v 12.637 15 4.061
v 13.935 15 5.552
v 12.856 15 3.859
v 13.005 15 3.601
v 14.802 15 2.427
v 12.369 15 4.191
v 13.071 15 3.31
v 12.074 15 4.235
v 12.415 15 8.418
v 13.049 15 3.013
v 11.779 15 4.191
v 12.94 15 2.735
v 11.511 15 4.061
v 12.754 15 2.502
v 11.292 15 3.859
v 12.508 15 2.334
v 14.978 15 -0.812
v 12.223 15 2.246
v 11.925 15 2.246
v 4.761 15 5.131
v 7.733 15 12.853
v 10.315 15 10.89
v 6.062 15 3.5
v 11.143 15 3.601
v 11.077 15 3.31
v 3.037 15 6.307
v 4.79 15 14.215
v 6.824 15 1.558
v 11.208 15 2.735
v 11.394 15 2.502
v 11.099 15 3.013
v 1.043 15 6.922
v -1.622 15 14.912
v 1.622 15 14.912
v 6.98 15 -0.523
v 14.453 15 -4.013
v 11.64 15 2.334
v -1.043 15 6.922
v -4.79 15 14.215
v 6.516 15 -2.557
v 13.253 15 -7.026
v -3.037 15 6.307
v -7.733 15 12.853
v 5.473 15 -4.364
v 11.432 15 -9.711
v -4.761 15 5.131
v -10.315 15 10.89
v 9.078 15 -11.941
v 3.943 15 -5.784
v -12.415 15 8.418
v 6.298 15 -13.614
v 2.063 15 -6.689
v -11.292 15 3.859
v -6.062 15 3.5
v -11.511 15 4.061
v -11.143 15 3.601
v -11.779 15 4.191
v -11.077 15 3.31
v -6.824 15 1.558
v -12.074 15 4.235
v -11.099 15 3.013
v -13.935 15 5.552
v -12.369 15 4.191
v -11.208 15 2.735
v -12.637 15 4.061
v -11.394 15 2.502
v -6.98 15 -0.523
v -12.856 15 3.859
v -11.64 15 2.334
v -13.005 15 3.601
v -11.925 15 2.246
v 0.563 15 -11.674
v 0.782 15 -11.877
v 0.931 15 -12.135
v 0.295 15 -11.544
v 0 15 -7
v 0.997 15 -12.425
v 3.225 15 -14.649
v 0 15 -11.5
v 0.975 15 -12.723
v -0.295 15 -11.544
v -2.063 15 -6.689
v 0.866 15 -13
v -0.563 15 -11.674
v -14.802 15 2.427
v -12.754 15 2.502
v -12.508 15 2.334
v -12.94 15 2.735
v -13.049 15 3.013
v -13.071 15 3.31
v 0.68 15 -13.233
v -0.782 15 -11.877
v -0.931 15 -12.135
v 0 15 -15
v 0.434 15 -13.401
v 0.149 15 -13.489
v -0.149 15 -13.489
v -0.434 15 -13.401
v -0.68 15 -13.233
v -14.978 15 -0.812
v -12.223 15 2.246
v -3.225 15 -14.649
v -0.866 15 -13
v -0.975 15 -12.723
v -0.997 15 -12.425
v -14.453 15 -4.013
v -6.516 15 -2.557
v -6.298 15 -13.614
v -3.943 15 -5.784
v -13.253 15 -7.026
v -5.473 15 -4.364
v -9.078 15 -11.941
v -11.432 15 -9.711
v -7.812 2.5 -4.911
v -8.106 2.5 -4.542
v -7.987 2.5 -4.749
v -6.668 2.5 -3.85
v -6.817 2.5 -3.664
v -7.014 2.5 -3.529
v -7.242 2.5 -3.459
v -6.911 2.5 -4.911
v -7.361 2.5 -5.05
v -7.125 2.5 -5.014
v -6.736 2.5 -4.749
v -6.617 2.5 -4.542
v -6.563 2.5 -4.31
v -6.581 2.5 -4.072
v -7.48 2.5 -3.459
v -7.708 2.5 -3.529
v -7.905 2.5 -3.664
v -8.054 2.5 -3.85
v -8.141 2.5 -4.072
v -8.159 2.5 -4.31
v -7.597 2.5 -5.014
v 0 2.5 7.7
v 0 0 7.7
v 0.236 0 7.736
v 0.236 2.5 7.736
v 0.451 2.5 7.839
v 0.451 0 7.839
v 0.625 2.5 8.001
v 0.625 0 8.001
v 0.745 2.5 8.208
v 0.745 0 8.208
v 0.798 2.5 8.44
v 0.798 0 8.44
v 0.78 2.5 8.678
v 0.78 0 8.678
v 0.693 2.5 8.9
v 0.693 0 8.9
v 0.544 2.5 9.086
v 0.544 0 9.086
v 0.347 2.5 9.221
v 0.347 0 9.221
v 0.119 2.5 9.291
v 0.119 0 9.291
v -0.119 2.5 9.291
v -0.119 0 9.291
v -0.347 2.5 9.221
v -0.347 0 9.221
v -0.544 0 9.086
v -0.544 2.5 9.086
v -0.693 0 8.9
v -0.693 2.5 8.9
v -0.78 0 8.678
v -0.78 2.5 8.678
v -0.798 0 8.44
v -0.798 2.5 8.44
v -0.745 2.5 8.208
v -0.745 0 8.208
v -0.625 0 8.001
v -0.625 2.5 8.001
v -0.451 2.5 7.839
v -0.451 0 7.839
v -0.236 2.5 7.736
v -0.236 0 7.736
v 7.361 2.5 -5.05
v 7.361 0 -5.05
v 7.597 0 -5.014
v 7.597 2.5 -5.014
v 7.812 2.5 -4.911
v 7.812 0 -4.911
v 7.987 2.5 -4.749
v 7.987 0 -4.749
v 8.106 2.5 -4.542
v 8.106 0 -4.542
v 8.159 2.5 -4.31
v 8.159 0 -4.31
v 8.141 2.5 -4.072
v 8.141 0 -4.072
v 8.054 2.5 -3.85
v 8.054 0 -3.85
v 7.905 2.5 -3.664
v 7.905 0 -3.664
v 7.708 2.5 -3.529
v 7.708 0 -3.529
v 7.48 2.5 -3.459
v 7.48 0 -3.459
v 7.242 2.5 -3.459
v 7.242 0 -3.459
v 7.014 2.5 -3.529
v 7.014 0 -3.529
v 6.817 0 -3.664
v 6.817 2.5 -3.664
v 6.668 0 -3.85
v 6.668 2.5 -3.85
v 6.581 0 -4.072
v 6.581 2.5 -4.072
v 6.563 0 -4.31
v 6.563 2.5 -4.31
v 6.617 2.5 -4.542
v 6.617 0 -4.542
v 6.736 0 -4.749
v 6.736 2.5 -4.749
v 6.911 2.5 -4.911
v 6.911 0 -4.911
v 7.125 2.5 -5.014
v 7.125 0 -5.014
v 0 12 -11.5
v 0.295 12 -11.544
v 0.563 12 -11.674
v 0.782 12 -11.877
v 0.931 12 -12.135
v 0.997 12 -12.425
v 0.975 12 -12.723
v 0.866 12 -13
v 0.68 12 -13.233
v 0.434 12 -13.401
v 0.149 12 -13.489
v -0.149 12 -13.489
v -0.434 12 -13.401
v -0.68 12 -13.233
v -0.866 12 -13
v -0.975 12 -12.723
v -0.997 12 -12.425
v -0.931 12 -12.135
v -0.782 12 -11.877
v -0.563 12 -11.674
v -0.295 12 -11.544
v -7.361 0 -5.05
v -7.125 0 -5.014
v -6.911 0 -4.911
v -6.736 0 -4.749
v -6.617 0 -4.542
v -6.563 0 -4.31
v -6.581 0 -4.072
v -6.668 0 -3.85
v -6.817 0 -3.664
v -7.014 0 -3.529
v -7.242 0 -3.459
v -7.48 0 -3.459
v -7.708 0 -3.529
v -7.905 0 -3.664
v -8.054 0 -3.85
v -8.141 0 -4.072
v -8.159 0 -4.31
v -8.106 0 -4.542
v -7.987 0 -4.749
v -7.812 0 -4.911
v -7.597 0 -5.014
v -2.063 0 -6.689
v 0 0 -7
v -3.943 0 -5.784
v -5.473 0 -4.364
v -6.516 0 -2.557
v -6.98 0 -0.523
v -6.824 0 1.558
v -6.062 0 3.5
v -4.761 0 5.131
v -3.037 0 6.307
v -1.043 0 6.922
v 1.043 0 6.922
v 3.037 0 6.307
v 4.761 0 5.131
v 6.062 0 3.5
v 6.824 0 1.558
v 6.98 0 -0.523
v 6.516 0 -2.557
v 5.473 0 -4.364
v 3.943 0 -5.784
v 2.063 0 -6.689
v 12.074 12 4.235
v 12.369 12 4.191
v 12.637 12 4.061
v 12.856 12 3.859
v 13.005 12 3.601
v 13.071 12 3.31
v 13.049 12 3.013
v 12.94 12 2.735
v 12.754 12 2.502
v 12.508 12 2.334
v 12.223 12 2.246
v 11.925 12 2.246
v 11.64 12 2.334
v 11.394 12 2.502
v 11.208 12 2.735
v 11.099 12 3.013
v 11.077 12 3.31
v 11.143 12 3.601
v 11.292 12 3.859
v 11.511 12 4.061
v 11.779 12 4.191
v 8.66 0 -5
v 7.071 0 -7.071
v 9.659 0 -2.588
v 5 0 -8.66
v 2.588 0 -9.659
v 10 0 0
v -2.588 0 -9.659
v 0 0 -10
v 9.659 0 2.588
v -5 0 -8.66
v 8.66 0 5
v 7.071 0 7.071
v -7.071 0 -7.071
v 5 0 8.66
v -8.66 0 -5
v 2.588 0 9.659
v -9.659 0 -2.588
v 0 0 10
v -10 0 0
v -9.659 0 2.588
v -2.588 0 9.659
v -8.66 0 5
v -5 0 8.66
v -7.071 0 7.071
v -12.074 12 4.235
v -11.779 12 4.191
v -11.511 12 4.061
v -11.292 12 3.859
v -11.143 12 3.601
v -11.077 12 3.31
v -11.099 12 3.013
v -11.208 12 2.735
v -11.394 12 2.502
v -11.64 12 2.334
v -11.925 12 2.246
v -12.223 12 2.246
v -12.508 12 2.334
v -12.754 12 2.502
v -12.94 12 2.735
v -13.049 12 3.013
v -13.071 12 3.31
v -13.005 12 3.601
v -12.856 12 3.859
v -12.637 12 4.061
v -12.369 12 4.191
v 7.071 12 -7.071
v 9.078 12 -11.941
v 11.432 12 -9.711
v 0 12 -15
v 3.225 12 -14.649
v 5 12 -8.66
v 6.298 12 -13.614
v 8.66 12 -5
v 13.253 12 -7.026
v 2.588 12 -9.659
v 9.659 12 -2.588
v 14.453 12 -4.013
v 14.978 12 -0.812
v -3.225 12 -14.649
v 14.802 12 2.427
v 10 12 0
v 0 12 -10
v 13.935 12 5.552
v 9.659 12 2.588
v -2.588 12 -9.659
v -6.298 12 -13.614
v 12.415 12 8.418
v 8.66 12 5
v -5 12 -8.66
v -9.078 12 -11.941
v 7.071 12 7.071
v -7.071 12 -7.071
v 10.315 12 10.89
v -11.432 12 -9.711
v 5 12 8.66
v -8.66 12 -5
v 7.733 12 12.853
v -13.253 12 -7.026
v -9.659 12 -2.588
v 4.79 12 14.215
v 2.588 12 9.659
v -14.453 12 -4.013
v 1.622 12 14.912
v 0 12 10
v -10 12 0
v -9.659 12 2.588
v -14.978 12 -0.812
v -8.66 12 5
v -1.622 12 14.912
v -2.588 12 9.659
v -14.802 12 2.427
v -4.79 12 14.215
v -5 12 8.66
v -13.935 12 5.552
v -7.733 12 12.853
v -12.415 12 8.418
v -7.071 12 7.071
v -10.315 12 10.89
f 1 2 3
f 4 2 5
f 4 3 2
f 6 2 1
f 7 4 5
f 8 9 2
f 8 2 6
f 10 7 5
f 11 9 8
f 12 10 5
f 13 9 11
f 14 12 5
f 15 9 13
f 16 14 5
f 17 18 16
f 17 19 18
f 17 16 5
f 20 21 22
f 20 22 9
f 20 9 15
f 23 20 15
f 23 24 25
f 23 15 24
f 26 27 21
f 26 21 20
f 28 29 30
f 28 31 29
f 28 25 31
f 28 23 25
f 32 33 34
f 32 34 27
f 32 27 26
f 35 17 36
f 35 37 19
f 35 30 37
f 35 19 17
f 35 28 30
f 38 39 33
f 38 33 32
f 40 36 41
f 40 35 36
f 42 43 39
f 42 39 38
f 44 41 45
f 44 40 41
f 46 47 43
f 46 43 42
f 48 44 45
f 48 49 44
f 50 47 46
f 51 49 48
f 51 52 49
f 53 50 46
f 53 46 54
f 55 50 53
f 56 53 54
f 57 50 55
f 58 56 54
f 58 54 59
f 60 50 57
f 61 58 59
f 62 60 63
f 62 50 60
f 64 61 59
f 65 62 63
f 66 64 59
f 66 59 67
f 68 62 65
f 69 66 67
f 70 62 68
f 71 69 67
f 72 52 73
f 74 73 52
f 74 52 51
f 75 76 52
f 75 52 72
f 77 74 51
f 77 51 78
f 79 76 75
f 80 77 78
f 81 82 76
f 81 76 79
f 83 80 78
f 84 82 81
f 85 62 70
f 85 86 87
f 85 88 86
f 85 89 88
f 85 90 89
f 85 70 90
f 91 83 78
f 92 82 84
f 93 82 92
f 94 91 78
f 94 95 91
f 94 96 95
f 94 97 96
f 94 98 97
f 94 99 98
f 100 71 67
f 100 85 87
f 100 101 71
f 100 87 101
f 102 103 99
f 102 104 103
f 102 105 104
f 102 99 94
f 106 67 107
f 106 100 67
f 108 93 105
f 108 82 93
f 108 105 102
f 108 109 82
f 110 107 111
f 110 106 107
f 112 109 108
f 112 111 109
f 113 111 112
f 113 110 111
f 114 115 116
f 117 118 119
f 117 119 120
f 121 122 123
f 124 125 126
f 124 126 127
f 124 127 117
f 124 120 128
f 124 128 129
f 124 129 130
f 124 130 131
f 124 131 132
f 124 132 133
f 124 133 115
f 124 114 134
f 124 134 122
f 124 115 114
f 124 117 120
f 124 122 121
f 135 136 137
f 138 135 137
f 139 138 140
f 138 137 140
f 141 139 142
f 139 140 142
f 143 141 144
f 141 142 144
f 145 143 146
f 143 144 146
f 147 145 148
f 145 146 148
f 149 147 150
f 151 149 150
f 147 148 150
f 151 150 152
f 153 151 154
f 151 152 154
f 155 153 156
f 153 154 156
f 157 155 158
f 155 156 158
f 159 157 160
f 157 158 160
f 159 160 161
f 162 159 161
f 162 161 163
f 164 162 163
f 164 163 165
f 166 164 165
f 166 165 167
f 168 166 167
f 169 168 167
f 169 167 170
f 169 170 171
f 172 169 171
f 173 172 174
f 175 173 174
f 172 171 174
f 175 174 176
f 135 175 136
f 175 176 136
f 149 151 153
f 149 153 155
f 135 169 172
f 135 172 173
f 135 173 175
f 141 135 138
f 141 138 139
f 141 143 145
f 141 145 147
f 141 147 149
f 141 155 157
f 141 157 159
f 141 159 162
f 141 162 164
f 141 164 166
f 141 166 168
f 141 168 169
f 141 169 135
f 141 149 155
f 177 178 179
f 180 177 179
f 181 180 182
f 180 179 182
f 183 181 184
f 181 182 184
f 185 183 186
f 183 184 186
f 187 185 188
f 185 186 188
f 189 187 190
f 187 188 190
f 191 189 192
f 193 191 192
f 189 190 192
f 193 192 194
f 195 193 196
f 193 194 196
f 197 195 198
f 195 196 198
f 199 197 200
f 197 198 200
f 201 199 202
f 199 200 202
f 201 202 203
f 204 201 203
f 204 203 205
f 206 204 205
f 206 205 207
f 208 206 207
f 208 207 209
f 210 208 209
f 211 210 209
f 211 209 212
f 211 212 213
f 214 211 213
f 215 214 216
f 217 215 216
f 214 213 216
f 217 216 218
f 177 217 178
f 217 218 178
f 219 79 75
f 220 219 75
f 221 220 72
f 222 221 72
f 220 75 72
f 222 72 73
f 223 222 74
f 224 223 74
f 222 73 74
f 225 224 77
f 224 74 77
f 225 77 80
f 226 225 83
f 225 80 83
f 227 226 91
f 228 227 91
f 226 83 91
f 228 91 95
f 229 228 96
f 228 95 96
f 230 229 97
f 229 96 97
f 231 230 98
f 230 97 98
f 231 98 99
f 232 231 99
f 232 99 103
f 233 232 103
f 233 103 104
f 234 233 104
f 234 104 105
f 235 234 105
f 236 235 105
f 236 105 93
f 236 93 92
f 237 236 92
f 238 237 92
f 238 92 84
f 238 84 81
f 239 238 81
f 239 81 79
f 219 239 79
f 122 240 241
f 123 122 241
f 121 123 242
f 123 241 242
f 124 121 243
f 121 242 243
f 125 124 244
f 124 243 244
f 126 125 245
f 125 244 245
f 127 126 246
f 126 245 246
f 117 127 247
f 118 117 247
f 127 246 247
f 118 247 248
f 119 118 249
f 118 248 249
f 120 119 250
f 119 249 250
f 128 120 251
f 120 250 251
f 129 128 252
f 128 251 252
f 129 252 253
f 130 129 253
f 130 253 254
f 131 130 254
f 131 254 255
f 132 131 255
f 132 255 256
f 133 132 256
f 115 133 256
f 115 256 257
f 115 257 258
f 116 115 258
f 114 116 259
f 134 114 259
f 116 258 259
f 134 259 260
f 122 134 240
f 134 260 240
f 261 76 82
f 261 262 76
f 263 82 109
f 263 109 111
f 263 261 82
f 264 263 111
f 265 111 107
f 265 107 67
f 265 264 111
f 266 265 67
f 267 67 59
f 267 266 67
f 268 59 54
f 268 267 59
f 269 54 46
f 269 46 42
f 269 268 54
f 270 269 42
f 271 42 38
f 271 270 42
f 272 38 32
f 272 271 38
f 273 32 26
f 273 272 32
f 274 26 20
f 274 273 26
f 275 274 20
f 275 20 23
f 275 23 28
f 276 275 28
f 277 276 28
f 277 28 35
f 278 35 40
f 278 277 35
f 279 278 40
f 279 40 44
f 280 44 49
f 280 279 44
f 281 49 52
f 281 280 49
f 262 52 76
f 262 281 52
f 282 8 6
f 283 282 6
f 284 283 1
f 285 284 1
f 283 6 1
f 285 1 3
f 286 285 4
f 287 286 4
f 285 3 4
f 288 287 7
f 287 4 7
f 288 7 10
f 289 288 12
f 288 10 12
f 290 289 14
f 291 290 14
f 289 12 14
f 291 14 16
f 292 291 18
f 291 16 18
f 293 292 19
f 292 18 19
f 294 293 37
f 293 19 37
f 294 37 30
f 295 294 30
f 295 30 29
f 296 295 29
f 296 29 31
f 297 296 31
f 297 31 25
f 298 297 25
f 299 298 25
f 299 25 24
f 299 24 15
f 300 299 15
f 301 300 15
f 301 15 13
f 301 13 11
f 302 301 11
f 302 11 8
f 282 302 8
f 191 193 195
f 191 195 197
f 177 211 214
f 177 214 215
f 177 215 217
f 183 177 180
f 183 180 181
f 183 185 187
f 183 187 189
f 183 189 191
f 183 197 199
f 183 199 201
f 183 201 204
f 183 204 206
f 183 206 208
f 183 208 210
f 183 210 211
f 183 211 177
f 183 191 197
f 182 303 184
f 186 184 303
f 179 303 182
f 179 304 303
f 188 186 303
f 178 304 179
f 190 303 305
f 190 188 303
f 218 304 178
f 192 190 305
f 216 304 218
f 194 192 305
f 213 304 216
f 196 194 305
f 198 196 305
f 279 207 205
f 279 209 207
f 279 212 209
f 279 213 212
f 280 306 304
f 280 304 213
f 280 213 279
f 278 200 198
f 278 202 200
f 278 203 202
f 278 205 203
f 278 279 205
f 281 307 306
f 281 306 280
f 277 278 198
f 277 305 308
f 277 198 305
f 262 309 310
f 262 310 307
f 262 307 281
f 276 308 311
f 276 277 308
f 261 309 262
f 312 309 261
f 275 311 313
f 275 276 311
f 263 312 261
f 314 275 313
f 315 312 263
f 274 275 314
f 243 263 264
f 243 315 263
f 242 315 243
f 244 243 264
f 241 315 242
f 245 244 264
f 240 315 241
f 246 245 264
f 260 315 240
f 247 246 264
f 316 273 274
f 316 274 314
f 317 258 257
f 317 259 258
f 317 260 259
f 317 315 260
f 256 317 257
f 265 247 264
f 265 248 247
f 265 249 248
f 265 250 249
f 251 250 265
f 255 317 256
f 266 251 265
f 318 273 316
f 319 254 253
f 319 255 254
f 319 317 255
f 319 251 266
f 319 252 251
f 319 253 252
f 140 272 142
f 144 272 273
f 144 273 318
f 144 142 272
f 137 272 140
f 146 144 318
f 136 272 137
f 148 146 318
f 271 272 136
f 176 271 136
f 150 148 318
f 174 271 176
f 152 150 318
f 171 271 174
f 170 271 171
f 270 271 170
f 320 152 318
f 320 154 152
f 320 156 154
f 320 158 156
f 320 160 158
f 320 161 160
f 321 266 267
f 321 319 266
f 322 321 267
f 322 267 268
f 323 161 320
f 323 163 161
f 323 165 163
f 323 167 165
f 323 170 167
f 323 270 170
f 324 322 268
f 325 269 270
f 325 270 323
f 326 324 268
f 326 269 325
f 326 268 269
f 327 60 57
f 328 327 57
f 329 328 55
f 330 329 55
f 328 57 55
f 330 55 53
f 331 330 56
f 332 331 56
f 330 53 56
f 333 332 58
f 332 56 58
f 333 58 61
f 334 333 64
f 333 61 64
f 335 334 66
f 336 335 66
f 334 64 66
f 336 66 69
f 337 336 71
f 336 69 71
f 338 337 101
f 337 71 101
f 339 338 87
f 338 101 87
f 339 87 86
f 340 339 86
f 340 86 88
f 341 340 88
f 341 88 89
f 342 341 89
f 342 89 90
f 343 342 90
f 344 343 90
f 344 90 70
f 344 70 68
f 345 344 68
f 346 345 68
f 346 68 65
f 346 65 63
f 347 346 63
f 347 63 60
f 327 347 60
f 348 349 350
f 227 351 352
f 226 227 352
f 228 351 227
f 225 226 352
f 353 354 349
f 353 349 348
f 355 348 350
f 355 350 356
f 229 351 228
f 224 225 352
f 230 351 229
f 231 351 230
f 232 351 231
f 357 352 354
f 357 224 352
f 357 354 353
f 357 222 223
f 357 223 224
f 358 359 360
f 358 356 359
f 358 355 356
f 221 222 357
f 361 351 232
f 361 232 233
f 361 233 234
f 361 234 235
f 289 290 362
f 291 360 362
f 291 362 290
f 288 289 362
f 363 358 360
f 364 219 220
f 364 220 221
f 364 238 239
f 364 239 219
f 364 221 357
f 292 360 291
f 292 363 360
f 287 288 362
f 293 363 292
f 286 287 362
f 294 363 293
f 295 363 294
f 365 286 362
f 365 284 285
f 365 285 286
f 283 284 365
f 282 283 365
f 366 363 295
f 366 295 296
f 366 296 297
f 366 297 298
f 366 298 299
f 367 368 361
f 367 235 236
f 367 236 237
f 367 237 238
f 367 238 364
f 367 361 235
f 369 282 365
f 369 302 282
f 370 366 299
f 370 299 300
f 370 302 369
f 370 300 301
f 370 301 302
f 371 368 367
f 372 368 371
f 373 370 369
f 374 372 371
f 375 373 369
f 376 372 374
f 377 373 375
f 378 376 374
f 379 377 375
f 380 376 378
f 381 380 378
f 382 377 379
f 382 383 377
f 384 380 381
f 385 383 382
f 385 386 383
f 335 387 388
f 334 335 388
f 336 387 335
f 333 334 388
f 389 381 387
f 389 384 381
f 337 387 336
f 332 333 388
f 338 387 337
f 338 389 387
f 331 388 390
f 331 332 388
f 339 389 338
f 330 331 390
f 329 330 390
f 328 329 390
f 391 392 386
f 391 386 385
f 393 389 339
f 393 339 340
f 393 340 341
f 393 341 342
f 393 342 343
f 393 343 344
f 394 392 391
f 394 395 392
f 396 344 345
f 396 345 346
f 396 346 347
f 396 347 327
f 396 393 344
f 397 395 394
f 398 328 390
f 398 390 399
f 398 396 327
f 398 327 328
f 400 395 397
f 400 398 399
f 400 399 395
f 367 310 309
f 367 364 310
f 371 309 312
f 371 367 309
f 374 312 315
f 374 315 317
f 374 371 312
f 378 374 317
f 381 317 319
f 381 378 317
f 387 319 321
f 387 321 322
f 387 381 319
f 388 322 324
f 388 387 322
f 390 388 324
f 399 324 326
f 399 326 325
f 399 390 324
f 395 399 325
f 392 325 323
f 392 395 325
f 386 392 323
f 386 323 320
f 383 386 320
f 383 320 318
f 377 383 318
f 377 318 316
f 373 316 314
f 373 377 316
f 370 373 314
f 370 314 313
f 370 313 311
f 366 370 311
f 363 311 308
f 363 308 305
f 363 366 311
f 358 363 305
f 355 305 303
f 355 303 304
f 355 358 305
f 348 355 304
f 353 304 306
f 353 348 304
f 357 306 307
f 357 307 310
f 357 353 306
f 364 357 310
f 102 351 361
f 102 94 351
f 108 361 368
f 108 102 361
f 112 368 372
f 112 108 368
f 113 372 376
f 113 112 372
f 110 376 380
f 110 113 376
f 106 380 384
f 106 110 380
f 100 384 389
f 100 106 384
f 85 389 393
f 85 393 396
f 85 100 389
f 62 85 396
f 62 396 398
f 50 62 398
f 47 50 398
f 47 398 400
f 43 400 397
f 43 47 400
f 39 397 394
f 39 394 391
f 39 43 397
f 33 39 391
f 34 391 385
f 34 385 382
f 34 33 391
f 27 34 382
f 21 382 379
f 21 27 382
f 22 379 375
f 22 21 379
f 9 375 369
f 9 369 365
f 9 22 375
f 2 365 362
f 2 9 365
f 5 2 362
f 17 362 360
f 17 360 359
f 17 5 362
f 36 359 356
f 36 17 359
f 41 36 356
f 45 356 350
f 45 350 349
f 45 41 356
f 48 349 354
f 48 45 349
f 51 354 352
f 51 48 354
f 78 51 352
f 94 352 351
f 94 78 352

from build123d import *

# Parameters (mm, degrees)
SKETCH2_R          = 1
CUT_EXTRUDE1_DEPTH = 26.980762114
SKETCH3_R          = 0.8
CUT_EXTRUDE2_DEPTH = 2.5


with BuildPart() as part:
    # Sketch1 → Revolve1 (revolve)
    with BuildSketch(Plane.XY, mode=Mode.PRIVATE) as revolve1_sk:
        Polygon((10, 0), (10, 12), (15, 12), (15, 15), (7, 15), (7, 0), align=None)
    revolve(revolve1_sk.sketch.rotate(Axis((0, 0, 0), (0, 1, 0)), 90), axis=Axis((0, 0, 0), (0, 1, 0)))

    # Sketch2 → Cut-Extrude1 (cut, through all)
    with BuildSketch(Plane(origin=(0, 15, 0), x_dir=(1, 0, 0), z_dir=(0, 1, 0))):
        with Locations(Location((0, 12.5, 0), (0, 0, 270))):
            Circle(SKETCH2_R)
        with Locations(Location((-12.074072829, -3.235238064, 0), (0, 0, 270))):
            Circle(SKETCH2_R)
        with Locations(Location((12.074072829, -3.235238064, 0), (0, 0, 270))):
            Circle(SKETCH2_R)
    extrude(amount=-CUT_EXTRUDE1_DEPTH, mode=Mode.SUBTRACT)

    # Sketch3 → Cut-Extrude2 (cut)
    with BuildSketch(Plane.XZ):
        with Locations(Location((0, 8.5, 0), (0, 0, 270))):
            Circle(SKETCH3_R)
        with Locations(Location((7.361215932, -4.25, 0), (0, 0, 270))):
            Circle(SKETCH3_R)
        with Locations(Location((-7.361215932, -4.25, 0), (0, 0, 270))):
            Circle(SKETCH3_R)
    extrude(amount=-CUT_EXTRUDE2_DEPTH, mode=Mode.SUBTRACT)


solid = part.part
